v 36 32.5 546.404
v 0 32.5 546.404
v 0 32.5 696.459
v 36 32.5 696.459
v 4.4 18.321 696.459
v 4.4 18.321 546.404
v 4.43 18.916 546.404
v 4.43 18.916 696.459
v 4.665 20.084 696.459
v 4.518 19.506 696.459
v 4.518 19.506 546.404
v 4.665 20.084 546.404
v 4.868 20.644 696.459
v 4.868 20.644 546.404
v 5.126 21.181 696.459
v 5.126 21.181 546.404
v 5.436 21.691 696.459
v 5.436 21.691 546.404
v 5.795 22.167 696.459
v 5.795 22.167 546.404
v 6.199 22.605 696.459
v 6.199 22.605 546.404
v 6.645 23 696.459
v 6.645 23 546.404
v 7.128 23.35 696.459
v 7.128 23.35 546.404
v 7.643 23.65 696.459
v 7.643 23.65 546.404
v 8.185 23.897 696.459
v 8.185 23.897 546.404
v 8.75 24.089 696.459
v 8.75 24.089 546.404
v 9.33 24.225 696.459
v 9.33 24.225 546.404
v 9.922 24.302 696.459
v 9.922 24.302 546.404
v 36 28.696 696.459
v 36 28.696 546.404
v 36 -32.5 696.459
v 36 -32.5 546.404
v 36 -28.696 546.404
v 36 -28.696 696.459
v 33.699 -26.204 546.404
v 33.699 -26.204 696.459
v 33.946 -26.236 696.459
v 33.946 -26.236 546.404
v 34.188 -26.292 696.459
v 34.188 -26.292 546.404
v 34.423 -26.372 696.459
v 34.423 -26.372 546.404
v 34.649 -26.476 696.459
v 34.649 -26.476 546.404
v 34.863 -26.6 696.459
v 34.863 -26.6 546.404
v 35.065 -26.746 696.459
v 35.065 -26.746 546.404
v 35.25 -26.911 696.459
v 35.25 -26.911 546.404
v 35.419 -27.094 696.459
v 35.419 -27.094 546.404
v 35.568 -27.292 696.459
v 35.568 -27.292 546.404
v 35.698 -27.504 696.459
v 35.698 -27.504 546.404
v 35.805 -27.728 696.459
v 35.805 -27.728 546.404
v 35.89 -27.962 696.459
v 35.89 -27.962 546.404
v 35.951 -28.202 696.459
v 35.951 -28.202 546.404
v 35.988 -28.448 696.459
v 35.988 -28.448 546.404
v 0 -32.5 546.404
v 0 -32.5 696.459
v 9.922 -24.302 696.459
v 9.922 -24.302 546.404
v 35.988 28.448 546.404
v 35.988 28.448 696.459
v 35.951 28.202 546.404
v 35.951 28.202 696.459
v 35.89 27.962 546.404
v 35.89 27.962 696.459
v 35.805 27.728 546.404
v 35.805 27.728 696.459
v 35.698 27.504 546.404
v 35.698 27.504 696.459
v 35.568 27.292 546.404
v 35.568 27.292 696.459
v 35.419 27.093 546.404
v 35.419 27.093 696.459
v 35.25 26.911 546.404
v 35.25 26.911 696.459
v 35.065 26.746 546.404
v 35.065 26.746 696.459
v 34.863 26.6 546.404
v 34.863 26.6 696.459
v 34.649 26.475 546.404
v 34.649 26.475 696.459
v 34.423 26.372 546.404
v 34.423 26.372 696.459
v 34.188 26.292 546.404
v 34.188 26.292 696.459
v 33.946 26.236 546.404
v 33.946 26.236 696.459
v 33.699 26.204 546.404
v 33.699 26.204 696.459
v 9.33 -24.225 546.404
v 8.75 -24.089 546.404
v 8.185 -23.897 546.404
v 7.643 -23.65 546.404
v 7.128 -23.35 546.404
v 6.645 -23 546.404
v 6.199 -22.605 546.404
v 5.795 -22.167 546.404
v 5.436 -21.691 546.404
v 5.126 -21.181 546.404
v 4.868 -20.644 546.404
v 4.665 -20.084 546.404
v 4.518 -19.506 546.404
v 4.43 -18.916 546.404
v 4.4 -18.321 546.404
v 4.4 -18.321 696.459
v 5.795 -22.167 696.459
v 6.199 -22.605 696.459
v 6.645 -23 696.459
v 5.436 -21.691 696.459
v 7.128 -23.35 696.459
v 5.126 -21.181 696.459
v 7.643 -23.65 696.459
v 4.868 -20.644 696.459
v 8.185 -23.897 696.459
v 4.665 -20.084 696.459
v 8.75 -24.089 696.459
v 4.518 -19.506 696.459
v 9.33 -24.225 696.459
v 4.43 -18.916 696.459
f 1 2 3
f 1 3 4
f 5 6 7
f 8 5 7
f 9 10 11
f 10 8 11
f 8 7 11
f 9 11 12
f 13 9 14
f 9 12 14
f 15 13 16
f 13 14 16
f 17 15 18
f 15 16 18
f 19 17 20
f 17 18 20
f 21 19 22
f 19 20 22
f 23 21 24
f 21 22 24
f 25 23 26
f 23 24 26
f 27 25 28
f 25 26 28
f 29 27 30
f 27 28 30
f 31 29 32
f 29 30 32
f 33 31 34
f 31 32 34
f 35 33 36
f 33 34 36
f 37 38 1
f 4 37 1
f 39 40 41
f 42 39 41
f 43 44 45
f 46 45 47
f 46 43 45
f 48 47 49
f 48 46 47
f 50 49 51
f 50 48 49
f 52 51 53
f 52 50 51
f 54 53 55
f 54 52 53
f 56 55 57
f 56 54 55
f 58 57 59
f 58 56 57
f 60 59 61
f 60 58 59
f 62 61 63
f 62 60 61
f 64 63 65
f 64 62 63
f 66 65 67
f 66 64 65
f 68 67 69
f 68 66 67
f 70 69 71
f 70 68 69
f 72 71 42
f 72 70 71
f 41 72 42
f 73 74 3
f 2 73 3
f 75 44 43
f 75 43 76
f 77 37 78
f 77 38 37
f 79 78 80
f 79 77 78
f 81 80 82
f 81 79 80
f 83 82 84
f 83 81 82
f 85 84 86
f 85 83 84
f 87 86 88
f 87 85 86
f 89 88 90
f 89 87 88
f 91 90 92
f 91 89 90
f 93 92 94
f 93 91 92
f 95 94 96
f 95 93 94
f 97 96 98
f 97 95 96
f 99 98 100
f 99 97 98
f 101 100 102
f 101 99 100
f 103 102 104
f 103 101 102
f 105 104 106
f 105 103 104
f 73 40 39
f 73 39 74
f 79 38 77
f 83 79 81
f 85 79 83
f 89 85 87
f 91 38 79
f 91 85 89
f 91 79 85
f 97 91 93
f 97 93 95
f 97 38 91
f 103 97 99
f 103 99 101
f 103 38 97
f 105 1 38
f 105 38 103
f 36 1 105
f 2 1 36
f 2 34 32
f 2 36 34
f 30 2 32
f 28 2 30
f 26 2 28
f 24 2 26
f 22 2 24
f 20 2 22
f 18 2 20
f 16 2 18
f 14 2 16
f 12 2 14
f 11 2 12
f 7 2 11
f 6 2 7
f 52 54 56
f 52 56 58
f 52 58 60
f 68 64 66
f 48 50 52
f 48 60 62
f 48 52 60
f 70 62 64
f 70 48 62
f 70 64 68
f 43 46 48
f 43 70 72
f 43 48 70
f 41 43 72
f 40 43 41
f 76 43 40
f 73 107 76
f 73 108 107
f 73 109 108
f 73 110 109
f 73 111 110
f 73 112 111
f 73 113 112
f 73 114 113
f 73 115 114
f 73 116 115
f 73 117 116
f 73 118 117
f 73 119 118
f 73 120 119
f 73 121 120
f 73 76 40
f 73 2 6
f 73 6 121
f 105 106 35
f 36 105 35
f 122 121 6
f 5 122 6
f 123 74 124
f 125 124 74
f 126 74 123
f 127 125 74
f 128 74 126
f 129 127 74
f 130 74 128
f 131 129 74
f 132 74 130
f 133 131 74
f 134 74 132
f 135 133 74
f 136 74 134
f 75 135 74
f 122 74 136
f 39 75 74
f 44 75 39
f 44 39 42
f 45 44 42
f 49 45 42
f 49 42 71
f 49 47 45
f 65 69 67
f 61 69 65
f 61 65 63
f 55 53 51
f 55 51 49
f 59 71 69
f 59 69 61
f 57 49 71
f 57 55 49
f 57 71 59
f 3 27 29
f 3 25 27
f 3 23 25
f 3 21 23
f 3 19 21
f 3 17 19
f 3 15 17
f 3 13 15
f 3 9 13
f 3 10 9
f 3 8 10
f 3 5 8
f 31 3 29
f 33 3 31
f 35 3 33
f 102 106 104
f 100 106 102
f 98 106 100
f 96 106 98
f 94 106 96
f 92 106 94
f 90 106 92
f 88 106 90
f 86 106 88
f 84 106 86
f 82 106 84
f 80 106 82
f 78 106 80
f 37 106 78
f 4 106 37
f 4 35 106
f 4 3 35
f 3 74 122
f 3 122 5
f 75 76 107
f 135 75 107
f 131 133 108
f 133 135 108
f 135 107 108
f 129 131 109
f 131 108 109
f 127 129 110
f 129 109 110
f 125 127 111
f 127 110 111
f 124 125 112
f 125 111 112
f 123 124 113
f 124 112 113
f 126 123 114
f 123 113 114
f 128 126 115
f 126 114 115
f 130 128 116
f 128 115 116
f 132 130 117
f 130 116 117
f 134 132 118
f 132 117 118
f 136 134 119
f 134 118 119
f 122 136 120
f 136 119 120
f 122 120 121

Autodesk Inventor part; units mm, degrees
ref_plane "Начальная плоскость" through (0, 0, 546.404) normal (0, 0, 1) x (1, 0, 0)
ref_plane "Конечная плоскость" through (0, 0, 696.459) normal (0, 0, 1) x (1, 0, 0)
sketch "Эскиз" plane through (0, 0, 0) normal (0, 0, 1) x (1, 0, 0)
  line L0 (36, -32.5) -> (0, -32.5)
  line L1 (36, -32.5) -> (36, -28.696)
  line L2 (33.6994, -26.2039) -> (9.9215, -24.3017)
  line L3 (4.4, -18.3208) -> (4.4, 18.3208)
  line L4 (33.6994, 26.2039) -> (9.9215, 24.3017)
  line L5 (36, 28.696) -> (36, 32.5)
  line L6 (0, 32.5) -> (36, 32.5)
  line L7 (0, -32.5) -> (0, 32.5)
  arc A0 (4.4, -18.3208) -> (9.9215, -24.3017) centre (10.4, -18.3208) ccw
  arc A1 (9.9215, 24.3017) -> (4.4, 18.3208) centre (10.4, 18.3208) ccw
  arc A2 (36, -28.696) -> (33.6994, -26.2039) centre (33.5, -28.696) ccw
  arc A3 (33.6994, 26.2039) -> (36, 28.696) centre (33.5, 28.696) ccw
  line L8 (0, 45.5) -> (0, -45.5) construction
  line L9 (-7.2974, 0) -> (43.7847, 0) construction
  point P0 (36, -26.388)
  point P1 (4.4, -23.86)
  point P2 (4.4, 23.86)
  point P3 (36, 26.388)
  dimension "d3" = 36
  dimension "d5" = 4.4
  dimension "d7" = 65
  dimension "d9" = 8.64
  dimension "d11" = 8.64
  dimension "d13" = 6.112
  dimension "d15" = 6.112
  dimension "d22" = 6
  dimension "d23" = 2.5
  dimension "d24" = 32.5
  dimension "d25" = 0
extrude "Тело" add sketch "Эскиз" along normal up to surface (150.055 mm away) from surface at 546.404
sketch "Sketch3" plane through (0, 0, 0) normal (0, 0, 1) x (1, 0, 0)
  line L0 (0, 0) -> (10, 0)
ref_plane "Work Plane7" through (0, 0, 0) normal (0, -1, 0) x (1, 0, 0)
sketch "Sketch4" plane through (0, 0, 0) normal (0, -1, 0) x (1, 0, 0)
  line L0 (-2, 546.404) -> (12, 546.404)
  line L1 (-2, 696.459) -> (12, 696.459)
  dimension "d29" = 150.055
ref_plane "РабПлоскость8" through (46, 32.5, 696.459) normal (0, 0, 1) x (1, 0, 0)
split "Разделение1" plane through (46, 32.5, 696.459) removes the side toward (0, 0, 1)
ref_plane "РабПлоскость9" through (35.9999, -174.672, 546.4041) normal (0, 0, -1) x (-1, 0, 0)
split "Разделение2" plane through (35.9999, -174.672, 546.4041) removes the side toward (0, 0, -1)
equation "\"d3\" = b"
equation "\"d5\" = t1"
equation "\"d7\" = ParH"
equation "\"d9\" = msp_x1 + t2"
equation "\"d11\" = msp_x1 + t2"
equation "\"d13\" = -msp_x2 + t2"
equation "\"d15\" = -msp_x2 + t2"
equation "\"d22\" = R"
equation "\"d23\" = R1"
equation "\"d24\" = 0.5 * d7"
equation "\"d16\" = G_L"
equation "\"R1\" = 2.5"
equation "\"R\" = 6"
equation "\"t1\" = 4.4"
equation "\"t2\" = 7.2"
equation "\"ParH\" = 65"
equation "\"b\" = 36"
equation "\"msp_x1\" = 0.04 * b"
equation "\"msp_x2\" = -0.08 * t1 + 0.04 * b"
equation "\"G_L\" = d29"
equation "\"ex\" = 0"
equation "\"G_OFFSET_START\" = -546.404"
equation "\"d26\" = -G_OFFSET_START"
equation "\"d27\" = G_OFFSET_END + B_L"
equation "\"B_L\" = 796.459"
equation "\"G_OFFSET_END\" = -100"
properties part number "Швеллер 6.5U-150,05 ГОСТ 8240-97" material "Сталь, мягкая"
